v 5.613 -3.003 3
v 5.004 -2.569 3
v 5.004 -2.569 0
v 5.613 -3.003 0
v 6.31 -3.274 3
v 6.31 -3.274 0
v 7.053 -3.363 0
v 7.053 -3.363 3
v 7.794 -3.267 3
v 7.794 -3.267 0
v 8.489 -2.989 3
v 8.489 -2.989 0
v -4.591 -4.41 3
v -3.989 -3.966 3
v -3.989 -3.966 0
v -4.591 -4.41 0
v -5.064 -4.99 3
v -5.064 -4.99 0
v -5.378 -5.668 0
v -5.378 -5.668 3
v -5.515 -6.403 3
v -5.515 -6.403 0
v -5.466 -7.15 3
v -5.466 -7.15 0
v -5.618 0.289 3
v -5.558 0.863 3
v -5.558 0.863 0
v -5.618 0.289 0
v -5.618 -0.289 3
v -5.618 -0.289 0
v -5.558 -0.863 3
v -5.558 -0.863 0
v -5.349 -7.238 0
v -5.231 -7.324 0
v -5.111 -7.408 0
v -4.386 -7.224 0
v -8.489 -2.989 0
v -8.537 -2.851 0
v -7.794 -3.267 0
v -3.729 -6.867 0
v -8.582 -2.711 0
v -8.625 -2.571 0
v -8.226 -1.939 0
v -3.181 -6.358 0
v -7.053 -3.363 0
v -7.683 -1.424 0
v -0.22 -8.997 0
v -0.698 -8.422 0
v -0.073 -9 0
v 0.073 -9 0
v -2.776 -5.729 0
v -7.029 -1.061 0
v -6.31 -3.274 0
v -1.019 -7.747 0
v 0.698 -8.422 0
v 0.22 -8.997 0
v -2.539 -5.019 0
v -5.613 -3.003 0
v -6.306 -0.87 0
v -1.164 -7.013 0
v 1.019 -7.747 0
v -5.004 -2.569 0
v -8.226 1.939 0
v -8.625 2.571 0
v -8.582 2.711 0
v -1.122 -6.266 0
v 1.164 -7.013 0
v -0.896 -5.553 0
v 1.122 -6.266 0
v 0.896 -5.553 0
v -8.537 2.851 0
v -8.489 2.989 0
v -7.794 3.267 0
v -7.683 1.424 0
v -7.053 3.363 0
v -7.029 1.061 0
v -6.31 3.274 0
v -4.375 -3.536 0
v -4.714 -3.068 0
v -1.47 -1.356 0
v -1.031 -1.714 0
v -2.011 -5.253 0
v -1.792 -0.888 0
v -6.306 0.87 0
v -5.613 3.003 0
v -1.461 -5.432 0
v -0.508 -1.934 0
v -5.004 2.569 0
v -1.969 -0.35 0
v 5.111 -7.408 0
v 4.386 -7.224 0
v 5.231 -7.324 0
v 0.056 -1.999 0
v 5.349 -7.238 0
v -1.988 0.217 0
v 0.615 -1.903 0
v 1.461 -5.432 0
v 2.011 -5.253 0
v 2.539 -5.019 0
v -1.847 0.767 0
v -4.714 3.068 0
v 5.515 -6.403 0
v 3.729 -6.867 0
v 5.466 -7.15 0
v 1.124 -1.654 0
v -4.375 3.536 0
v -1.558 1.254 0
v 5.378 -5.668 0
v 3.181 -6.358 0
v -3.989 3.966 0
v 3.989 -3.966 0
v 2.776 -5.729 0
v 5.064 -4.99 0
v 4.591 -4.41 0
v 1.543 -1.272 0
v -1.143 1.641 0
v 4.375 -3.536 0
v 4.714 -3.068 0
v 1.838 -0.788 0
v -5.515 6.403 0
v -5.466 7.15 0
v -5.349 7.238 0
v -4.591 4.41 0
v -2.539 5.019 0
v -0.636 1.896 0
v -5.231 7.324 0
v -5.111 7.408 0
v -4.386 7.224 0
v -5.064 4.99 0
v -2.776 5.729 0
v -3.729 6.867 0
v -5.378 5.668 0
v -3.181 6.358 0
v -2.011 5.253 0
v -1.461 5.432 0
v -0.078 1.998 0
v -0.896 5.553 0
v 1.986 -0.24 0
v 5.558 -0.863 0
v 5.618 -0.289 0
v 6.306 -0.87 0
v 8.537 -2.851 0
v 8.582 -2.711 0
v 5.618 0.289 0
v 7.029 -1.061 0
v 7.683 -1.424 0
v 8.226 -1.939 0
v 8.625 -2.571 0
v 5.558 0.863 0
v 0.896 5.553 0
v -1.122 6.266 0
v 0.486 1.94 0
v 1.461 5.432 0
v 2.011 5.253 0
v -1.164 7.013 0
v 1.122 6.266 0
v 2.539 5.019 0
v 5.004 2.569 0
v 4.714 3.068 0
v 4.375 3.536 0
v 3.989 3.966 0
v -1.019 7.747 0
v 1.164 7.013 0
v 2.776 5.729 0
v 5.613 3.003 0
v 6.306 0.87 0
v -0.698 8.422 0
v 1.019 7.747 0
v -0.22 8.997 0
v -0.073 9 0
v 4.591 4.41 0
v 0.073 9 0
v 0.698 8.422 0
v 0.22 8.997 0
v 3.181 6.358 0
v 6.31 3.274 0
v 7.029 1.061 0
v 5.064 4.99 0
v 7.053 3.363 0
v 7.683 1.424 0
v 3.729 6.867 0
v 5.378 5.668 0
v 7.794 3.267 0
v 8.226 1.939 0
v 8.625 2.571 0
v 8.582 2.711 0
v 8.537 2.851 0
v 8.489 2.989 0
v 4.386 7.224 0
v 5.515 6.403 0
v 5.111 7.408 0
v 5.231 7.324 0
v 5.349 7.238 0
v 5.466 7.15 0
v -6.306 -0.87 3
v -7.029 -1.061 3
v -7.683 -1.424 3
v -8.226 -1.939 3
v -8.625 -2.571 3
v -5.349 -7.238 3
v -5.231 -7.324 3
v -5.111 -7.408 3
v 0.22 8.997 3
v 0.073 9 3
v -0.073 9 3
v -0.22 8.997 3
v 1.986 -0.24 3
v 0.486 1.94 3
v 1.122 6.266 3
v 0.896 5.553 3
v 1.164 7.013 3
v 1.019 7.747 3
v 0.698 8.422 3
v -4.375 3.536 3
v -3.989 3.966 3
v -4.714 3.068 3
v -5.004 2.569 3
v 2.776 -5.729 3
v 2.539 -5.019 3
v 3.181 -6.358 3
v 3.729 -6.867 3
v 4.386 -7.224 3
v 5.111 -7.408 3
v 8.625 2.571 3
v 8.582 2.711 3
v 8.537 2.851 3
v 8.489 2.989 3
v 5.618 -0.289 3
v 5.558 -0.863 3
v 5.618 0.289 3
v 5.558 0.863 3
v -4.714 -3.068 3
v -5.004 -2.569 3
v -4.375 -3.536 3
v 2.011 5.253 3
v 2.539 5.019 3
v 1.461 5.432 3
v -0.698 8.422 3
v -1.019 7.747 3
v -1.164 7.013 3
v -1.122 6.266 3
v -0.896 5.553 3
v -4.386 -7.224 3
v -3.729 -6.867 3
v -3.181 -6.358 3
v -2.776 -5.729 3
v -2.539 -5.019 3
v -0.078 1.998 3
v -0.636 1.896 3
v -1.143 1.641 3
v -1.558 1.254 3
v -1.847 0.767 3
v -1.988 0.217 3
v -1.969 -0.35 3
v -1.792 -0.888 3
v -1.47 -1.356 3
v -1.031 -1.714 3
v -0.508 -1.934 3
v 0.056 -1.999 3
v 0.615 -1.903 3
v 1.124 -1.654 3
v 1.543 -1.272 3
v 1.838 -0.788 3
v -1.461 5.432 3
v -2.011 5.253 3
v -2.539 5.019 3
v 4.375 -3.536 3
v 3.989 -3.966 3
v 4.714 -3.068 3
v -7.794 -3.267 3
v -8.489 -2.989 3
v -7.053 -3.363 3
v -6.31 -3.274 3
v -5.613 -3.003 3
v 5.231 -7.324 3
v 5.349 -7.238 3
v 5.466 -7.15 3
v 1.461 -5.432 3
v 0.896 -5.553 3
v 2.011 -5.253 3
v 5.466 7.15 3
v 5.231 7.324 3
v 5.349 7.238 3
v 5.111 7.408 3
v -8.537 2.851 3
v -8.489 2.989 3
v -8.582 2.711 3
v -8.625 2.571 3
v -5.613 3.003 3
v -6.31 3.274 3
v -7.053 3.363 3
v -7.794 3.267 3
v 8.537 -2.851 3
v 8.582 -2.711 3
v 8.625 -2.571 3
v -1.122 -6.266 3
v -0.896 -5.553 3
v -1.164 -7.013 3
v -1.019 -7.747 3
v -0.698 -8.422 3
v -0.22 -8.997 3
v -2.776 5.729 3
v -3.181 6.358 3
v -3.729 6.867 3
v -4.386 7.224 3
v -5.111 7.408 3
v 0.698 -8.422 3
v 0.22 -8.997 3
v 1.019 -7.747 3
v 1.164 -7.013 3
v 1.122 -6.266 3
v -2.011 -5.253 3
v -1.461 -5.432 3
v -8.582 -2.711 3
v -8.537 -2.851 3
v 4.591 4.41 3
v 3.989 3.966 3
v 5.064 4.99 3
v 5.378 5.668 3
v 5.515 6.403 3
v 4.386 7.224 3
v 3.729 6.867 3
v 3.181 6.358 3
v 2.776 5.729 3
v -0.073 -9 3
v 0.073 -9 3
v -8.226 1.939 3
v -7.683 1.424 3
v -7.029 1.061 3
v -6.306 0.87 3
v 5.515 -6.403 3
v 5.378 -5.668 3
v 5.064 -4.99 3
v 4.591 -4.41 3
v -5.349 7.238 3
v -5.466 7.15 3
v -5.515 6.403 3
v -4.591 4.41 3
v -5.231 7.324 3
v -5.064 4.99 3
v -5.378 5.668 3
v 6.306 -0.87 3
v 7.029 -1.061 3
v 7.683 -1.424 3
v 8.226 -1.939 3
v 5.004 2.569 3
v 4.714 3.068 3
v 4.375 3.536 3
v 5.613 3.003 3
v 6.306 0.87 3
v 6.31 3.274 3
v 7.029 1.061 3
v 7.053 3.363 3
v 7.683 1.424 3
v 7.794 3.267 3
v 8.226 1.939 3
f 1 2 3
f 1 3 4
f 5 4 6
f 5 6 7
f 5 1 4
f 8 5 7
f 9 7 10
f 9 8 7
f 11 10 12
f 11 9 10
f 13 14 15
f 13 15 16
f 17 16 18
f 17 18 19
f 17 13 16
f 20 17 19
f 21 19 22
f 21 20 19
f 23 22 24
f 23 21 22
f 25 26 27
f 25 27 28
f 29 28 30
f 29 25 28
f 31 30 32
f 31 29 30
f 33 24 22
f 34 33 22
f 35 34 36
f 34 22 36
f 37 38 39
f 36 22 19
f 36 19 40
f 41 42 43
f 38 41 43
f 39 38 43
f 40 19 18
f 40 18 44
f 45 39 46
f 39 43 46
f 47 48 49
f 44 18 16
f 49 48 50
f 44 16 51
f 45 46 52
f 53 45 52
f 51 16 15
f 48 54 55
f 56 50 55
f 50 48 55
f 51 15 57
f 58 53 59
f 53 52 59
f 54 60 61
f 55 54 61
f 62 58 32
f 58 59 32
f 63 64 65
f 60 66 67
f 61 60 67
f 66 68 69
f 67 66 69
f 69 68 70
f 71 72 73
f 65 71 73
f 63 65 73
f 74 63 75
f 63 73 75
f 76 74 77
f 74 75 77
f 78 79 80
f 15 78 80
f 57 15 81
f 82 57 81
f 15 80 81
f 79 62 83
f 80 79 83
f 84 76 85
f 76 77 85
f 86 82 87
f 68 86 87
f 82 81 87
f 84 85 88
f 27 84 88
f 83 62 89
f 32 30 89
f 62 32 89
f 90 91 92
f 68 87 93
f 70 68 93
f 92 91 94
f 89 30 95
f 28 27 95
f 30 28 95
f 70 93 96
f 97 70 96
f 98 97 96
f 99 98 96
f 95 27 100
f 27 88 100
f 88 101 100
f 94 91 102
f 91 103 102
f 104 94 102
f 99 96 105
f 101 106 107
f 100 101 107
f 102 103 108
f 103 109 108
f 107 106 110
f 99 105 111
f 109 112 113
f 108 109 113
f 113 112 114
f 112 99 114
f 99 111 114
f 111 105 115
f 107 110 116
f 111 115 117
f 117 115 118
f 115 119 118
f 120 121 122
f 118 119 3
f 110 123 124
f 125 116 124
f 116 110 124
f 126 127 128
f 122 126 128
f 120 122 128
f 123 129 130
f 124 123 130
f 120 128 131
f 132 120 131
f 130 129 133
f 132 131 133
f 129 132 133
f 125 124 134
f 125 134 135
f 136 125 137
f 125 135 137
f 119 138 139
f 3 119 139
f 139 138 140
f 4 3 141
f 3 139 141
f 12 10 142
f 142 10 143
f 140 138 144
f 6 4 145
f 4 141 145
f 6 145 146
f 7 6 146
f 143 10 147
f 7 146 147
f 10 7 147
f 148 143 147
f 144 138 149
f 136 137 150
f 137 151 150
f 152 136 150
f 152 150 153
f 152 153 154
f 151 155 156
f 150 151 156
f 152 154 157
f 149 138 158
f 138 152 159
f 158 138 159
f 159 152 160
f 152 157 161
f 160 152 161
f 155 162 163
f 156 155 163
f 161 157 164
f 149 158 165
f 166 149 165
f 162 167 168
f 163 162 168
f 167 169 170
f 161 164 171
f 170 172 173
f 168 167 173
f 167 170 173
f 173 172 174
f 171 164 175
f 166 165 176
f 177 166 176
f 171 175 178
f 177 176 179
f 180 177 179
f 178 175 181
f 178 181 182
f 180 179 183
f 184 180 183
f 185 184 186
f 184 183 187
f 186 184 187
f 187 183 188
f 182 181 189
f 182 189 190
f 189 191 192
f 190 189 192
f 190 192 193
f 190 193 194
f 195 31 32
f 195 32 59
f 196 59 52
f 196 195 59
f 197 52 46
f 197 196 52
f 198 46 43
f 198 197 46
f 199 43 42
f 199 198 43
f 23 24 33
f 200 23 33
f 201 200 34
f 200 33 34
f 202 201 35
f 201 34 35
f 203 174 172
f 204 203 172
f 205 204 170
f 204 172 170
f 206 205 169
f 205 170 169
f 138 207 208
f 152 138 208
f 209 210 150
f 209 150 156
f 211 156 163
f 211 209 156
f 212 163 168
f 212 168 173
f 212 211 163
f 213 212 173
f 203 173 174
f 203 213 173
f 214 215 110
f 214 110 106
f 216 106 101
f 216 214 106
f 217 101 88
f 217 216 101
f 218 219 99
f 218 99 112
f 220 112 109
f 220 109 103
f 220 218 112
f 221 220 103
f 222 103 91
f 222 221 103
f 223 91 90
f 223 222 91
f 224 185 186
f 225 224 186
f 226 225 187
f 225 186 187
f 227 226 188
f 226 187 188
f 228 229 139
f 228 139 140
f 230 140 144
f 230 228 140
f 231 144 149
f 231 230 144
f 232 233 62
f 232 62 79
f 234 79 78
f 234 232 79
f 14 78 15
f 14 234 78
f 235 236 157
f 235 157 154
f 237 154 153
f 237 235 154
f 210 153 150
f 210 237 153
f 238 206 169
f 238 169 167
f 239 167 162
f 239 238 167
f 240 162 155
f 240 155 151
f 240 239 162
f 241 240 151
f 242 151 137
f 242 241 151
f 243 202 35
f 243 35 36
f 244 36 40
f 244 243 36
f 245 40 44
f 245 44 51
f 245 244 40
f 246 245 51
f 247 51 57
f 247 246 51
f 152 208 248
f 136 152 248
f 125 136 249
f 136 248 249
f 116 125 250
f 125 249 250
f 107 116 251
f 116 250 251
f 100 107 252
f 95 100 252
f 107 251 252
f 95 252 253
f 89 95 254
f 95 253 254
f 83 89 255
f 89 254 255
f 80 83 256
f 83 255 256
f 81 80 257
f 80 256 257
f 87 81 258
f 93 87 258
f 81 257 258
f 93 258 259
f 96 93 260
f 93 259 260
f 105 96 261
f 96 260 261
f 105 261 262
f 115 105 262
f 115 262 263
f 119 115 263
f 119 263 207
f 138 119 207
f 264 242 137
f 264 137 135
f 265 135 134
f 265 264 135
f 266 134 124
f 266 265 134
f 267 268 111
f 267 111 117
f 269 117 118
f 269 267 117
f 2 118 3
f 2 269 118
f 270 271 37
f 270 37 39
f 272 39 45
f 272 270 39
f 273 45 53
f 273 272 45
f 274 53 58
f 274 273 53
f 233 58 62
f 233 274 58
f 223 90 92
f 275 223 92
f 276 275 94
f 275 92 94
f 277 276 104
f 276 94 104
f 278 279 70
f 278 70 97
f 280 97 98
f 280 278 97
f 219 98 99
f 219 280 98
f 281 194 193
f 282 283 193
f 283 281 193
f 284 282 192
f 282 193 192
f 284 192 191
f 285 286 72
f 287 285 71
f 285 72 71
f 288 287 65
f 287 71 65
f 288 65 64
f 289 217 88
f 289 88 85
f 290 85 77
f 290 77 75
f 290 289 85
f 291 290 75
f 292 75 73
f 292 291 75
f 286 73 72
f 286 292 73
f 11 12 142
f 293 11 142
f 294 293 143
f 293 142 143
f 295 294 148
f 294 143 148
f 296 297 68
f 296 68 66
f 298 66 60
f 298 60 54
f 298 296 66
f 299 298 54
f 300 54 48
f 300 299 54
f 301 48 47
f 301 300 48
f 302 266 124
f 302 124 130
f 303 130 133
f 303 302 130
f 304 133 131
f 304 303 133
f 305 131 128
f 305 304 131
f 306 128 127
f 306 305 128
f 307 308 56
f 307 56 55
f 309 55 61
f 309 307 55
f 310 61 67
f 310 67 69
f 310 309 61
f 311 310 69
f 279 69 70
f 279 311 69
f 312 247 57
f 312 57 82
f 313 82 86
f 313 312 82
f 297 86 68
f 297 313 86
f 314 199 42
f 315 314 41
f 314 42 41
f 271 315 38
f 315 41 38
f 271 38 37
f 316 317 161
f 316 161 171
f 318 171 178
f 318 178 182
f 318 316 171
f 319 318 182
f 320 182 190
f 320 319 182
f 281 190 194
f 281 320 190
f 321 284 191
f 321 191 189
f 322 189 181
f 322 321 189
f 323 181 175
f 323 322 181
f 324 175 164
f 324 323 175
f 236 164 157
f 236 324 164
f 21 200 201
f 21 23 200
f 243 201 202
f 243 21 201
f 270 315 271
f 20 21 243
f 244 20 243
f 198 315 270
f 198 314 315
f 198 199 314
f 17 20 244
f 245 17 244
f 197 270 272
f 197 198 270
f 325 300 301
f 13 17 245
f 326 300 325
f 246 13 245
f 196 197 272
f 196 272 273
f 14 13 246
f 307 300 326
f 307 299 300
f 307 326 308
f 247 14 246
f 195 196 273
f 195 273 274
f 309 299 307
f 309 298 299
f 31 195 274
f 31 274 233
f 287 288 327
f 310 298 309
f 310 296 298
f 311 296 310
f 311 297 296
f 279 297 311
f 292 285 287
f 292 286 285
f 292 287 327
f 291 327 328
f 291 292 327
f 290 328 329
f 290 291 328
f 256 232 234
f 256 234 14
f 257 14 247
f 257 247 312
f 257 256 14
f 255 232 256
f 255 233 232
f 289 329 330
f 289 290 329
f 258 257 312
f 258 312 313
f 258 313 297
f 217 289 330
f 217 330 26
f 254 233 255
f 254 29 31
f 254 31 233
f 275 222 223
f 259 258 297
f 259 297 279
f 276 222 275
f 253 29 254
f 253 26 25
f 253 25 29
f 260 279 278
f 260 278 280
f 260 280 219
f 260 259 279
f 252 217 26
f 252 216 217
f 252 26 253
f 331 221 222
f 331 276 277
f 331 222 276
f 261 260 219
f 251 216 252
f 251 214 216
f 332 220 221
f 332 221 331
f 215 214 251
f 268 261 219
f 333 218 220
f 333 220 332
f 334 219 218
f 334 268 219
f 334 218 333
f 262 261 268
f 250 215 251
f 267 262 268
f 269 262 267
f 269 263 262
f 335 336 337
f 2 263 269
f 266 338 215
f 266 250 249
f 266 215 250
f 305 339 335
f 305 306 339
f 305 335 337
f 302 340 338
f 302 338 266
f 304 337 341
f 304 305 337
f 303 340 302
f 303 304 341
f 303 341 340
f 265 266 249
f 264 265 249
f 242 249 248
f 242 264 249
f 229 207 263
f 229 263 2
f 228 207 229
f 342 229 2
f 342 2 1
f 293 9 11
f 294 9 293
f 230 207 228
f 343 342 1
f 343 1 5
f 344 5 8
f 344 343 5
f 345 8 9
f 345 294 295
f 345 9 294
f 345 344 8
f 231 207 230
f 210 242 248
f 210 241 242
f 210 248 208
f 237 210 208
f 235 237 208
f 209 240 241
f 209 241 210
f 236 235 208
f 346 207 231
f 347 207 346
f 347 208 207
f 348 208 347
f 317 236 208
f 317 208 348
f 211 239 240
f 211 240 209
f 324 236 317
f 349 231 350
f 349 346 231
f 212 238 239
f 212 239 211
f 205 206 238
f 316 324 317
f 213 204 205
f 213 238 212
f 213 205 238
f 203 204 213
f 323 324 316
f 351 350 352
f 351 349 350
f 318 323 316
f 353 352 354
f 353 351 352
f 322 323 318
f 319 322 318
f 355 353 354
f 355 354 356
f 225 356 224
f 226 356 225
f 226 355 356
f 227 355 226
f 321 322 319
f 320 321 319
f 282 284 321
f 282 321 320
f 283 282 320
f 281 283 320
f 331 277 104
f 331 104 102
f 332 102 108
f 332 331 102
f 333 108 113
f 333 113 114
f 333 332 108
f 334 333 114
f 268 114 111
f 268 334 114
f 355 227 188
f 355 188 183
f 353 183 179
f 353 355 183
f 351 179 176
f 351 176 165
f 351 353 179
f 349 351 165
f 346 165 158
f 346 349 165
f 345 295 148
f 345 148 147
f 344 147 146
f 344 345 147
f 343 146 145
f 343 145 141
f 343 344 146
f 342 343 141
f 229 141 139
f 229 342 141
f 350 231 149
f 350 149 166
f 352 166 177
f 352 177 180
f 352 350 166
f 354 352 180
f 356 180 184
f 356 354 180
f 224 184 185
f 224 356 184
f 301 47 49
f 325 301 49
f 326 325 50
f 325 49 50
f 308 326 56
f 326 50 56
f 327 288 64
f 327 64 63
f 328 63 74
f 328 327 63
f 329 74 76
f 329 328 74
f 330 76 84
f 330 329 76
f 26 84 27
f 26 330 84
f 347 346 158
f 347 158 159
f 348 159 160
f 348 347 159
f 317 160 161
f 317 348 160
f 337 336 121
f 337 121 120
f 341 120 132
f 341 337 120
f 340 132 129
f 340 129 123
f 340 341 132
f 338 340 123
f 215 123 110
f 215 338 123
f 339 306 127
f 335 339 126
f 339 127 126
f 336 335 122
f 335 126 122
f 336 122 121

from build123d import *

# Parameters (mm, degrees)
SKETCH1_R           = 9
BOSS_EXTRUDE1_DEPTH = 3
CUT_EXTRUDE1_DEPTH  = 14.076696831
CIRPATTERN1_COUNT   = 10
CUT_EXTRUDE4_DEPTH  = 13.821408374


with BuildPart() as part:
    # Sketch1 → Boss-Extrude1 (new body)
    with BuildSketch(Plane.XY):
        Circle(SKETCH1_R)
    extrude(amount=BOSS_EXTRUDE1_DEPTH)

    # Sketch2 → Cut-Extrude1 (cut, through all)
    with BuildSketch(Plane.XY.offset(3)):
        with BuildLine():
            ThreePointArc((5.110667533, 7.408176386), (3.438910397, 6.629232039), (2.538761327, 5.019493592))
            ThreePointArc((2.538761327, 5.019493592), (1.738220593, 5.349692904), (0.896483249, 5.553102087))
            ThreePointArc((0.896483249, 5.553102087), (1.114427873, 7.384502195), (0.21979994, 8.997315599))
            ThreePointArc((0.21979994, 8.997315599), (2.781152949, 8.559508647), (5.110667533, 7.408176386))
        make_face()
    cut_extrude1 = extrude(amount=-CUT_EXTRUDE1_DEPTH, mode=Mode.SUBTRACT)

    # CirPattern1: Cut-Extrude1 ×10 about axis
    cirpattern1_axis = Axis((0, 0, 0), (0, 0, 1))
    for i in range(1, CIRPATTERN1_COUNT):
        add(cut_extrude1.rotate(cirpattern1_axis, i * 360 / CIRPATTERN1_COUNT), mode=Mode.SUBTRACT)

    # Sketch5 → Cut-Extrude4 (cut, through all)
    with BuildSketch(Plane.XY.offset(3)):
        with BuildLine():
            Line((1.985580324, -0.239730633), (0.486047904, 1.940040575))
            ThreePointArc((0.486047904, 1.940040575), (-1.647752152, -1.133539961), (1.985580324, -0.239730633))
        make_face()
    extrude(amount=-CUT_EXTRUDE4_DEPTH, mode=Mode.SUBTRACT)


solid = part.part
